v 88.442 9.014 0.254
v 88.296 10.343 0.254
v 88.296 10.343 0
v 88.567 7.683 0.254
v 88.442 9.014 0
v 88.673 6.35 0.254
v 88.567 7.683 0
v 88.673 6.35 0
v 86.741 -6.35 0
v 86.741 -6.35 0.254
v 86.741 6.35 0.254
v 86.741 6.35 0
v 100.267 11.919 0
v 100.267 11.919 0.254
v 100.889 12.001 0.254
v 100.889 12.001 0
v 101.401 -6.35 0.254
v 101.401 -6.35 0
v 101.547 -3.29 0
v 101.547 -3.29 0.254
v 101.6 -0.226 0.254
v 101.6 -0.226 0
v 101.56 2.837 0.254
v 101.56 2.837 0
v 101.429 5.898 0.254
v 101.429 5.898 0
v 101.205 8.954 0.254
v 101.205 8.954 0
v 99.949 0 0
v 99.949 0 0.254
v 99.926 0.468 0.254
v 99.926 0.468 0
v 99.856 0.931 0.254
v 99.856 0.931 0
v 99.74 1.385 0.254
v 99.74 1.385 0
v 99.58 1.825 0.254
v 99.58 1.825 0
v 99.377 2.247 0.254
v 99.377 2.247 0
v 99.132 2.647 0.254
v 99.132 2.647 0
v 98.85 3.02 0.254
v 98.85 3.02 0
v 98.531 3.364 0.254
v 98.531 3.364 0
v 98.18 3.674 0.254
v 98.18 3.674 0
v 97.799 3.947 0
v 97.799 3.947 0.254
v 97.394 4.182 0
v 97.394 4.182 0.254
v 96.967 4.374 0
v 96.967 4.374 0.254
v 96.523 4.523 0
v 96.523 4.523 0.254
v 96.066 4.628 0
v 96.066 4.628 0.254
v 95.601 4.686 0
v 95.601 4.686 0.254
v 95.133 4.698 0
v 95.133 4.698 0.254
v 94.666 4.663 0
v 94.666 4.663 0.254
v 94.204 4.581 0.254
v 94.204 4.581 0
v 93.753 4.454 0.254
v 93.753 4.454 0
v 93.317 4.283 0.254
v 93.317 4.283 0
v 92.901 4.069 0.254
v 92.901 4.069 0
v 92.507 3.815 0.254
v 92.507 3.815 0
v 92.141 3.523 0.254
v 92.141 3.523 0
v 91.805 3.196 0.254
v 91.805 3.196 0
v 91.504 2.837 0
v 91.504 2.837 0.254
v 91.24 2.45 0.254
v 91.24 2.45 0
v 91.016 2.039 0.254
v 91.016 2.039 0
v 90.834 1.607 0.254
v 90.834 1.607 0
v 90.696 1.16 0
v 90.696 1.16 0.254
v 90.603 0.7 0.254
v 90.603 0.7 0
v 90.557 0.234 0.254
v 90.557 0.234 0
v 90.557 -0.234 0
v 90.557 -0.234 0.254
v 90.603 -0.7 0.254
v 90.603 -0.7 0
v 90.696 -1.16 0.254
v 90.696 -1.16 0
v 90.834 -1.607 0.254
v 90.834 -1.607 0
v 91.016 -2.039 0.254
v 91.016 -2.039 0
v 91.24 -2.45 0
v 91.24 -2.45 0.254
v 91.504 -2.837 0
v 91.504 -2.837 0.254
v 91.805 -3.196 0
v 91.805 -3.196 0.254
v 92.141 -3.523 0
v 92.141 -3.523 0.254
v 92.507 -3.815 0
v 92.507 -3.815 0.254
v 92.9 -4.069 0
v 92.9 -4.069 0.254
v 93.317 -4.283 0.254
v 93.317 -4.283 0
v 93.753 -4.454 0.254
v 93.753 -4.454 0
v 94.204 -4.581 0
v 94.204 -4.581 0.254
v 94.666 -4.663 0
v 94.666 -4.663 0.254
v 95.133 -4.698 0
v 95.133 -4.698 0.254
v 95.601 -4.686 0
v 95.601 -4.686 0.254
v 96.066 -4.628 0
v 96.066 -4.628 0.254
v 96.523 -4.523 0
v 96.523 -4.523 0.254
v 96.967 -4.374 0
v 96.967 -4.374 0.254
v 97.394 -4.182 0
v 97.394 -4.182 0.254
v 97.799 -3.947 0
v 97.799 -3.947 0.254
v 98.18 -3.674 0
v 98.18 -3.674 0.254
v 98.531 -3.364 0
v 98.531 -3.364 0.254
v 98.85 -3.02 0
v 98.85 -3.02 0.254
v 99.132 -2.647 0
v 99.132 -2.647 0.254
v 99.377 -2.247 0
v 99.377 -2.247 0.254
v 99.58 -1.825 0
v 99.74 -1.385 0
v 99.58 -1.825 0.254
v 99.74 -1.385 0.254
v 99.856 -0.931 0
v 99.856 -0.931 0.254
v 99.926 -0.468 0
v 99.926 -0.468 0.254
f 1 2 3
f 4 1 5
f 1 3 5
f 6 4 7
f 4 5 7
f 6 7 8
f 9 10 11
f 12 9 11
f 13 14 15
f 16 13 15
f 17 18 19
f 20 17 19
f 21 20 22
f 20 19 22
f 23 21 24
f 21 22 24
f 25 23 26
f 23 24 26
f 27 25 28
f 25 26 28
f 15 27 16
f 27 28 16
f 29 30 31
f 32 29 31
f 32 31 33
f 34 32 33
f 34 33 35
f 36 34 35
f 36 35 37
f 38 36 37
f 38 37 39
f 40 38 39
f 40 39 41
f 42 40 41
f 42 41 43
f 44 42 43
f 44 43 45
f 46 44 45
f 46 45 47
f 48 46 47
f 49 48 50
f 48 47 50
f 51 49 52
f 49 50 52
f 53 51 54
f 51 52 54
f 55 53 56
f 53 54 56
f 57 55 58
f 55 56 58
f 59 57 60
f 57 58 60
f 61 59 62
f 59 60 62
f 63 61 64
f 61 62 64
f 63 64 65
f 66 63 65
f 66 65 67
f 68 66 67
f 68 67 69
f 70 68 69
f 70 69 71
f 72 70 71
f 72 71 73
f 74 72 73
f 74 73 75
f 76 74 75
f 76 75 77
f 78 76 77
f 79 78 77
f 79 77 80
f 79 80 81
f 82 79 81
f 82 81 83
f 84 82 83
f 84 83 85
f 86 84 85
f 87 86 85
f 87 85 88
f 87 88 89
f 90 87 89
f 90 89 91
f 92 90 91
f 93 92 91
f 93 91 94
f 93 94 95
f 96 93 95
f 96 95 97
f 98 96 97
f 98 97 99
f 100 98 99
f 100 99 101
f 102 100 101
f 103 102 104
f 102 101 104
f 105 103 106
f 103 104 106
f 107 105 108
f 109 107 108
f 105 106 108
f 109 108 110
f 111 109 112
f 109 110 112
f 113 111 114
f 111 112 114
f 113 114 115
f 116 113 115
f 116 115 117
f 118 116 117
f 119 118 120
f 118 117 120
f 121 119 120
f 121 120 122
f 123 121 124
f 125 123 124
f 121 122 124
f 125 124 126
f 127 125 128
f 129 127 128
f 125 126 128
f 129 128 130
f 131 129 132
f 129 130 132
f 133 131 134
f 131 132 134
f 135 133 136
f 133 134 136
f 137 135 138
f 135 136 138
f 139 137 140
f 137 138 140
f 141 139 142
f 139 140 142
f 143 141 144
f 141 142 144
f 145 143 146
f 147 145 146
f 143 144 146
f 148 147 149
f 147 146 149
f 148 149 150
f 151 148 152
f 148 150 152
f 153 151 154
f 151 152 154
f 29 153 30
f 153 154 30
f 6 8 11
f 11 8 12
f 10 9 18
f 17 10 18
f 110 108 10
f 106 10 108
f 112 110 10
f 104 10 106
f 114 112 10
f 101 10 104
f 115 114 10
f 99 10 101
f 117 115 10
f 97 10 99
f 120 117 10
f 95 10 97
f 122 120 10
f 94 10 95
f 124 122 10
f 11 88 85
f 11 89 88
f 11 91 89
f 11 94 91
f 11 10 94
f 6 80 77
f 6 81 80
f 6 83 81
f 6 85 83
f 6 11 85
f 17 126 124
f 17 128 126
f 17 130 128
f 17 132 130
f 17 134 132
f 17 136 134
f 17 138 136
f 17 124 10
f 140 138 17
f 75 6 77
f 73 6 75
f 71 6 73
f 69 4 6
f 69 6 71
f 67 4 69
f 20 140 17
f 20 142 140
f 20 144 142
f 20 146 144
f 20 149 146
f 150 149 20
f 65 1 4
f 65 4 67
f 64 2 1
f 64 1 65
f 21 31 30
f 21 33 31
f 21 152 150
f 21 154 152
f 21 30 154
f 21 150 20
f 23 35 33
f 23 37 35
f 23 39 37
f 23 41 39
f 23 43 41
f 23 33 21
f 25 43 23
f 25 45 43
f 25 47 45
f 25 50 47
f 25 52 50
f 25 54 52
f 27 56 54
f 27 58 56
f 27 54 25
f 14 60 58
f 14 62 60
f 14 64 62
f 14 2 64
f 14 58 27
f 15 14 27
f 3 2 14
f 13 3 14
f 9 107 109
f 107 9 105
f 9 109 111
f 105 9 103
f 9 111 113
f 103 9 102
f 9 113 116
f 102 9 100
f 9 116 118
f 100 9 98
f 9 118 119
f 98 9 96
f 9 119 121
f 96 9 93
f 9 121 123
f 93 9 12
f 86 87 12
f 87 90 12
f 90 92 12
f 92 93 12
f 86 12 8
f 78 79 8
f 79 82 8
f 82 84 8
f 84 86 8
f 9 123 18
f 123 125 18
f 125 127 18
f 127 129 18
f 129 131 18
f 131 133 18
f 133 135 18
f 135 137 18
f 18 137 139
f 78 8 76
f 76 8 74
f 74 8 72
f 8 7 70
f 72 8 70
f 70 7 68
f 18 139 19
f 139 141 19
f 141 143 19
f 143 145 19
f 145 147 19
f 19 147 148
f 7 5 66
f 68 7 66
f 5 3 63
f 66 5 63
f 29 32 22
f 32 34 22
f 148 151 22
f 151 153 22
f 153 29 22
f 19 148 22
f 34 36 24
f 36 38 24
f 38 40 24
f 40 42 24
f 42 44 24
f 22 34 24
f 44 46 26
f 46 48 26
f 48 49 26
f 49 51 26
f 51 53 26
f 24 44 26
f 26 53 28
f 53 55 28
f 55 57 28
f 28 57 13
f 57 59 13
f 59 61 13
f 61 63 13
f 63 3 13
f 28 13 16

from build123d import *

# Parameters (mm, degrees)
BOSS_EXTRUDE1_DEPTH = 0.254
SKETCH2_R           = 4.699
CUT_EXTRUDE1_DEPTH  = 1.254
SKETCH3_W           = 2.54
SKETCH3_H           = 0.635
CUT_EXTRUDE2_DEPTH  = 1.254
SKETCH5_OUTSIDE_W   = 121.447
SKETCH5_OUTSIDE_H   = 109.618
CUT_EXTRUDE5_DEPTH  = 1.254


with BuildPart() as part:
    # Sketch1 → Boss-Extrude1 (new body)
    with BuildSketch(Plane.XY):
        with BuildLine():
            Line((67.21146711, 76.191723231), (8.696654013, 17.676910134))
            Line((8.696654013, 17.676910134), (7.228954972, 14.133571205))
            ThreePointArc((7.228954972, 14.133571205), (14.666587579, 6.075099489), (15.105587123, -4.88230096))
            Line((15.105587123, -4.88230096), (18.648926052, -6.35))
            Line((18.648926052, -6.35), (101.401368334, -6.35))
            ThreePointArc((101.401368334, -6.35), (93.866160503, 38.880636728), (67.21146711, 76.191723231))
        make_face()
        with BuildLine():
            Line((88.672924278, 6.35), (27.86051193, 6.35))
            ThreePointArc((27.86051193, 6.35), (26.399857642, 10.93517908), (24.190484974, 15.210228852))
            Line((24.190484974, 15.210228852), (67.191354125, 58.211098004))
            ThreePointArc((67.191354125, 58.211098004), (82.13289044, 34.020557137), (88.672924278, 6.35))
        make_face(mode=Mode.SUBTRACT)
    extrude(amount=BOSS_EXTRUDE1_DEPTH)

    # Sketch2 → Cut-Extrude1 (cut, through all)
    with BuildSketch(Plane.XY.offset(0.254)):
        with Locations((22.225, 0)):
            Circle(SKETCH2_R)
        with Locations((36.195, 0)):
            Circle(SKETCH2_R)
        with Locations((61.722, 0)):
            Circle(SKETCH2_R)
        with Locations((75.692, 0)):
            Circle(SKETCH2_R)
        with Locations((95.25, 0)):
            Circle(SKETCH2_R)
        with Locations((15.715448212, 15.715448212)):
            Circle(SKETCH2_R)
        with Locations((25.593729945, 25.593729945)):
            Circle(SKETCH2_R)
        with Locations((43.644044748, 43.644044748)):
            Circle(SKETCH2_R)
        with Locations((53.522326482, 53.522326482)):
            Circle(SKETCH2_R)
        with Locations((92.004434954, 24.652514046)):
            Circle(SKETCH2_R)
        with Locations((82.48891971, 47.625)):
            Circle(SKETCH2_R)
        with Locations((67.351920908, 67.351920908)):
            Circle(SKETCH2_R)
    extrude(amount=-CUT_EXTRUDE1_DEPTH, mode=Mode.SUBTRACT)

    # Sketch3 → Cut-Extrude2 (cut, through all)
    with BuildSketch(Plane.XY.offset(0.254)):
        Polygon((15.266435406, 24.246691527), (17.06248663, 26.042742751), (17.511499436, 25.593729945), (15.715448212, 23.797678721), align=None)
        Polygon((44.991083167, 53.971339288), (43.195031942, 52.175288063), (43.644044748, 51.726275257), (45.440095973, 53.522326482), align=None)
        with Locations((29.21, -6.0325)):
            Rectangle(SKETCH3_W, SKETCH3_H)
        with Locations((68.707, -6.0325)):
            Rectangle(SKETCH3_W, SKETCH3_H)
        Polygon((29.230733674, 38.210989795), (31.026784898, 40.007041019), (31.475797704, 39.558028213), (29.67974648, 37.761976989), align=None)
        Polygon((56.845021246, 65.825277367), (55.048970022, 64.029226143), (55.497982828, 63.580213337), (57.294034052, 65.376264561), align=None)
        with Locations((48.9585, -6.0325)):
            Rectangle(SKETCH3_W, SKETCH3_H)
        with Locations((85.471, -6.0325)):
            Rectangle(SKETCH3_W, SKETCH3_H)
        Polygon((99.935462164, 14.437711971), (100.266998693, 11.919442024), (101.526133667, 12.085210288), (101.194597138, 14.603480236), align=None)
        Polygon((93.765504959, 37.464305742), (94.938831965, 37.950313702), (93.966816047, 40.296967714), (92.793489041, 39.810959755), align=None)
        Polygon((79.327792988, 62.471156422), (80.874047017, 60.456038938), (81.88160576, 61.229165953), (80.33535173, 63.244283437), align=None)
        Polygon((13.593916116, 7.005422516), (14.565932035, 4.658768503), (15.739259041, 5.144776462), (14.767243123, 7.491430475), align=None)
    extrude(amount=-CUT_EXTRUDE2_DEPTH, mode=Mode.SUBTRACT)

    # Sketch5 outside → Cut-Extrude5 (cut, through all)
    with BuildSketch(Plane.XY.offset(0.254)):
        with Locations((54.4145, 34.921)):
            Rectangle(SKETCH5_OUTSIDE_W, SKETCH5_OUTSIDE_H)
        Polygon((86.741, -7.62), (86.741, 10.138710513), (102.87, 12.262133647), (102.87, -7.62), align=None, mode=Mode.SUBTRACT)
    extrude(amount=-CUT_EXTRUDE5_DEPTH, mode=Mode.SUBTRACT)


solid = part.part
